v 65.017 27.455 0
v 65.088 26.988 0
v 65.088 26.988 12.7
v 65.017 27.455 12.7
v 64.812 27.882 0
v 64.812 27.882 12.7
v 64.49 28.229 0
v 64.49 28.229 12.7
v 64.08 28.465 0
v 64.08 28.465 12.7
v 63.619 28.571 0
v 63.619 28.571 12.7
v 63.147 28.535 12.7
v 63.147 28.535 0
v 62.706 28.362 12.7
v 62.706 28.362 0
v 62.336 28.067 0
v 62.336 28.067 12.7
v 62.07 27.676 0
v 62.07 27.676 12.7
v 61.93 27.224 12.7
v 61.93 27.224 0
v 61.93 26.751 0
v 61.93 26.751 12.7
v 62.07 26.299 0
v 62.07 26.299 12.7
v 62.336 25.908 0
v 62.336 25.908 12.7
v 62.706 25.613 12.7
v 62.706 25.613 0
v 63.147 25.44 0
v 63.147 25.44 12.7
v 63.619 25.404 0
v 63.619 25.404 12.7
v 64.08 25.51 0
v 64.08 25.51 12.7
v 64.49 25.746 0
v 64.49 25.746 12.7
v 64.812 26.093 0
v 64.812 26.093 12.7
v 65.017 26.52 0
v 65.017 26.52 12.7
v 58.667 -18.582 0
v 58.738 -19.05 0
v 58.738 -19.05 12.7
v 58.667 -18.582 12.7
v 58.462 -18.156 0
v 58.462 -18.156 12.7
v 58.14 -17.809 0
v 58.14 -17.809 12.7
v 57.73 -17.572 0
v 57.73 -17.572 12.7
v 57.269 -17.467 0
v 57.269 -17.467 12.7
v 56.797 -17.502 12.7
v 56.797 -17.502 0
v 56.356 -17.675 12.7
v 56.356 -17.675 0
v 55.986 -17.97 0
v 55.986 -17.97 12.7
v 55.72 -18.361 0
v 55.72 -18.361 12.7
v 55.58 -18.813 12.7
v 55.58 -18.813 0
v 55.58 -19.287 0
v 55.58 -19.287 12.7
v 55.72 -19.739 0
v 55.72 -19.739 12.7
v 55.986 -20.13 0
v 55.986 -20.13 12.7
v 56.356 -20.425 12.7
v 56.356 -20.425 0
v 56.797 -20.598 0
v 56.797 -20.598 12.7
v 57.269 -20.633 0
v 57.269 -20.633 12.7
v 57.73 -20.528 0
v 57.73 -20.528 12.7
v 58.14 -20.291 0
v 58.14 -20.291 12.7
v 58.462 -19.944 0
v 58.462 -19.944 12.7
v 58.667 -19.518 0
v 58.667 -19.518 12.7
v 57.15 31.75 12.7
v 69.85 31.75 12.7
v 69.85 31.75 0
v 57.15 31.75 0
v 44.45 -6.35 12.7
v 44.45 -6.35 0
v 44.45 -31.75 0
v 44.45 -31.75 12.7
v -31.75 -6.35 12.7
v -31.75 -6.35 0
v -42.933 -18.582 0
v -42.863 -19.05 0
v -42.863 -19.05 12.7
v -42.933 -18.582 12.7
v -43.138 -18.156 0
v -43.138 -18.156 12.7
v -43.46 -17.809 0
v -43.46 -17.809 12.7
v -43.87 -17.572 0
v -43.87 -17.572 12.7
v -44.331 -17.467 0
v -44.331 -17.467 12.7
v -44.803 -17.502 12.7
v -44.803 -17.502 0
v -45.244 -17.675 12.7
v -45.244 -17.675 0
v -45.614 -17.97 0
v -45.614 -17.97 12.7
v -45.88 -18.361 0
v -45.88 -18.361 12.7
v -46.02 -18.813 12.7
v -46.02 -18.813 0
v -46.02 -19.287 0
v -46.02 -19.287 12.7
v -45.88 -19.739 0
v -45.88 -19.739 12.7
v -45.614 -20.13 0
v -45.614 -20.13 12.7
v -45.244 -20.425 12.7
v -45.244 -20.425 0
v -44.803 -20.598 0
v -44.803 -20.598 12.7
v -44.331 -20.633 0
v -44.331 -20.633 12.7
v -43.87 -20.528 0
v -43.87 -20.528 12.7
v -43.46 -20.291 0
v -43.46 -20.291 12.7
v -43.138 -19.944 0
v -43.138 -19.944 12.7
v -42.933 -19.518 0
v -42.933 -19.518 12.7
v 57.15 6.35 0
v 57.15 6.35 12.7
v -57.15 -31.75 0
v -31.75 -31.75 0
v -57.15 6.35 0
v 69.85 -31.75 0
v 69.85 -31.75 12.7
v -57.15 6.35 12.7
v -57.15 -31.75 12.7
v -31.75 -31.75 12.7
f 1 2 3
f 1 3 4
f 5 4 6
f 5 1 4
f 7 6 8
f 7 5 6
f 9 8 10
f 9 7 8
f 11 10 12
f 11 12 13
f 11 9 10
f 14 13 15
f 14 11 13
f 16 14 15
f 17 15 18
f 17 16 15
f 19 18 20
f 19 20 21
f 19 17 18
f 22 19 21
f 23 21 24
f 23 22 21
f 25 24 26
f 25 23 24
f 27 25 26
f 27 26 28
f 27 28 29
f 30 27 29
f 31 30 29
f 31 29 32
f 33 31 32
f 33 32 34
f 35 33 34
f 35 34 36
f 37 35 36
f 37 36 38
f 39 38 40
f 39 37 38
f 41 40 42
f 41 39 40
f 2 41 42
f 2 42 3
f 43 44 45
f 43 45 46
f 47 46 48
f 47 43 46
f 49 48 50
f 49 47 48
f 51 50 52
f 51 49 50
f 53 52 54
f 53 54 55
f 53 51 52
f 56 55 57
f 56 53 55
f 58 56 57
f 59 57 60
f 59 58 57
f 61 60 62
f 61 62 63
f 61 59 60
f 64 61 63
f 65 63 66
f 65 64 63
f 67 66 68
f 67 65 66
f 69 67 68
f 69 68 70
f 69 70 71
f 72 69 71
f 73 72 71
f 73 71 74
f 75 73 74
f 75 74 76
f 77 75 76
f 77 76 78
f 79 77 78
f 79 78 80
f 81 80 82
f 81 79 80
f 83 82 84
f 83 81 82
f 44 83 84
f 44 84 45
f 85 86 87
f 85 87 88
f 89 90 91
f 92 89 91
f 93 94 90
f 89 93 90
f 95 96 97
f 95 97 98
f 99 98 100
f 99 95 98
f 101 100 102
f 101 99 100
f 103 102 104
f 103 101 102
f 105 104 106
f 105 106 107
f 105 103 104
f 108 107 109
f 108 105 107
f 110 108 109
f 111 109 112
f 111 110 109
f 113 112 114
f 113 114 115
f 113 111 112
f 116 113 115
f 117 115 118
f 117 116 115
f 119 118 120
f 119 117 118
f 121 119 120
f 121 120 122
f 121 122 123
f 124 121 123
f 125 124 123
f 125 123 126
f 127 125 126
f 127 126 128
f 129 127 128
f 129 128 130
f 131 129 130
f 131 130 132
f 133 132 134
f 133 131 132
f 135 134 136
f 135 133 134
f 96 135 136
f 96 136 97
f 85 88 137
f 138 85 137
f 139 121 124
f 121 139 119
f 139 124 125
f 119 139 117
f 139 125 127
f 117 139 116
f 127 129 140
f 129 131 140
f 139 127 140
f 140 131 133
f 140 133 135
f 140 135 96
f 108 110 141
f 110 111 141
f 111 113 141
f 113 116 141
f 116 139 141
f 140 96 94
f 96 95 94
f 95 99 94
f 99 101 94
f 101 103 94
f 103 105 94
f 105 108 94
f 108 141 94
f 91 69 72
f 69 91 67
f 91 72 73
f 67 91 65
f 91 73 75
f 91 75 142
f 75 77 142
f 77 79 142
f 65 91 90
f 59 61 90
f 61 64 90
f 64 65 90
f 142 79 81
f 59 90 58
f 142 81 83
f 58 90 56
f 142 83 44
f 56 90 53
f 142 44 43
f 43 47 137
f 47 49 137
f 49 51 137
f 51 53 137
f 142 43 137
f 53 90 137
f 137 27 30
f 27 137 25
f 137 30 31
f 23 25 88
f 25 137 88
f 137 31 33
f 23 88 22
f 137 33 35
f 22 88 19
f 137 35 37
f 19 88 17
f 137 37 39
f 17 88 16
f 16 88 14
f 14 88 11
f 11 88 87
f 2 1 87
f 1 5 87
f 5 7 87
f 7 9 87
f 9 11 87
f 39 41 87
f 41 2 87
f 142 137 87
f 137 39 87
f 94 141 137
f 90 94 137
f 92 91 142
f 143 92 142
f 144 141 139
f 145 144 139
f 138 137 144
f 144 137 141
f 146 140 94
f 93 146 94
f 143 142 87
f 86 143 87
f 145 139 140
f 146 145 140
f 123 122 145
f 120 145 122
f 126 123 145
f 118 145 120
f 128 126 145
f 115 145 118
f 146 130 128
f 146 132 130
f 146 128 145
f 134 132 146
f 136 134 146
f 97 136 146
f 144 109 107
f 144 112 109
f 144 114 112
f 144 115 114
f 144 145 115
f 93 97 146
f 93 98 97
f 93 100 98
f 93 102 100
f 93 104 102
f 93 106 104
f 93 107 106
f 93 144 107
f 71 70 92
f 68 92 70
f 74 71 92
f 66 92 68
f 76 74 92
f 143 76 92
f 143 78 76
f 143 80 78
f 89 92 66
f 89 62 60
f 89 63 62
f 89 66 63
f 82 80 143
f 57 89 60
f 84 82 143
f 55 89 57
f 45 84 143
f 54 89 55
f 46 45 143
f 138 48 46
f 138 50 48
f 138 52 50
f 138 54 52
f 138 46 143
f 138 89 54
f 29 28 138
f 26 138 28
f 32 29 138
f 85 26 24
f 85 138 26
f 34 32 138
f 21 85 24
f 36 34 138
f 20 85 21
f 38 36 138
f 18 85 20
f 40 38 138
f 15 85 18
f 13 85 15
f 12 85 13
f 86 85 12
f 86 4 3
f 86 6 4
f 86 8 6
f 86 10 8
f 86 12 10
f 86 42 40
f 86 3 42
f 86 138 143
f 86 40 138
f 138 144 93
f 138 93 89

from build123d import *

# Parameters (mm, degrees)
F0_W     = 25.4
F0_H     = 25.4
F0_R     = 1.5875
F1_DEPTH = 12.7


with BuildPart() as f1:
    # F0 (on Top) → F1 (new body)
    with BuildSketch(Plane.XY):
        Polygon((44.45, -6.35), (57.15, -6.35), (57.15, 6.35), (-57.15, 6.35), (-57.15, -6.35), (-31.75, -6.35), (31.75, -6.35), align=None)
        with Locations((-44.45, -19.05)):
            Rectangle(F0_W, F0_H)
        with Locations((-44.45, -19.05)):
            Circle(F0_R, mode=Mode.SUBTRACT)
        Polygon((69.85, -6.35), (57.15, -6.35), (44.45, -6.35), (44.45, -31.75), (69.85, -31.75), align=None)
        with Locations((57.15, -19.05)):
            Circle(F0_R, mode=Mode.SUBTRACT)
        Polygon((57.15, 6.35), (57.15, -6.35), (69.85, -6.35), (69.85, 31.75), (57.15, 31.75), align=None)
        with Locations((63.5, 26.9875)):
            Circle(F0_R, mode=Mode.SUBTRACT)
    extrude(amount=F1_DEPTH)


solid = f1.part
